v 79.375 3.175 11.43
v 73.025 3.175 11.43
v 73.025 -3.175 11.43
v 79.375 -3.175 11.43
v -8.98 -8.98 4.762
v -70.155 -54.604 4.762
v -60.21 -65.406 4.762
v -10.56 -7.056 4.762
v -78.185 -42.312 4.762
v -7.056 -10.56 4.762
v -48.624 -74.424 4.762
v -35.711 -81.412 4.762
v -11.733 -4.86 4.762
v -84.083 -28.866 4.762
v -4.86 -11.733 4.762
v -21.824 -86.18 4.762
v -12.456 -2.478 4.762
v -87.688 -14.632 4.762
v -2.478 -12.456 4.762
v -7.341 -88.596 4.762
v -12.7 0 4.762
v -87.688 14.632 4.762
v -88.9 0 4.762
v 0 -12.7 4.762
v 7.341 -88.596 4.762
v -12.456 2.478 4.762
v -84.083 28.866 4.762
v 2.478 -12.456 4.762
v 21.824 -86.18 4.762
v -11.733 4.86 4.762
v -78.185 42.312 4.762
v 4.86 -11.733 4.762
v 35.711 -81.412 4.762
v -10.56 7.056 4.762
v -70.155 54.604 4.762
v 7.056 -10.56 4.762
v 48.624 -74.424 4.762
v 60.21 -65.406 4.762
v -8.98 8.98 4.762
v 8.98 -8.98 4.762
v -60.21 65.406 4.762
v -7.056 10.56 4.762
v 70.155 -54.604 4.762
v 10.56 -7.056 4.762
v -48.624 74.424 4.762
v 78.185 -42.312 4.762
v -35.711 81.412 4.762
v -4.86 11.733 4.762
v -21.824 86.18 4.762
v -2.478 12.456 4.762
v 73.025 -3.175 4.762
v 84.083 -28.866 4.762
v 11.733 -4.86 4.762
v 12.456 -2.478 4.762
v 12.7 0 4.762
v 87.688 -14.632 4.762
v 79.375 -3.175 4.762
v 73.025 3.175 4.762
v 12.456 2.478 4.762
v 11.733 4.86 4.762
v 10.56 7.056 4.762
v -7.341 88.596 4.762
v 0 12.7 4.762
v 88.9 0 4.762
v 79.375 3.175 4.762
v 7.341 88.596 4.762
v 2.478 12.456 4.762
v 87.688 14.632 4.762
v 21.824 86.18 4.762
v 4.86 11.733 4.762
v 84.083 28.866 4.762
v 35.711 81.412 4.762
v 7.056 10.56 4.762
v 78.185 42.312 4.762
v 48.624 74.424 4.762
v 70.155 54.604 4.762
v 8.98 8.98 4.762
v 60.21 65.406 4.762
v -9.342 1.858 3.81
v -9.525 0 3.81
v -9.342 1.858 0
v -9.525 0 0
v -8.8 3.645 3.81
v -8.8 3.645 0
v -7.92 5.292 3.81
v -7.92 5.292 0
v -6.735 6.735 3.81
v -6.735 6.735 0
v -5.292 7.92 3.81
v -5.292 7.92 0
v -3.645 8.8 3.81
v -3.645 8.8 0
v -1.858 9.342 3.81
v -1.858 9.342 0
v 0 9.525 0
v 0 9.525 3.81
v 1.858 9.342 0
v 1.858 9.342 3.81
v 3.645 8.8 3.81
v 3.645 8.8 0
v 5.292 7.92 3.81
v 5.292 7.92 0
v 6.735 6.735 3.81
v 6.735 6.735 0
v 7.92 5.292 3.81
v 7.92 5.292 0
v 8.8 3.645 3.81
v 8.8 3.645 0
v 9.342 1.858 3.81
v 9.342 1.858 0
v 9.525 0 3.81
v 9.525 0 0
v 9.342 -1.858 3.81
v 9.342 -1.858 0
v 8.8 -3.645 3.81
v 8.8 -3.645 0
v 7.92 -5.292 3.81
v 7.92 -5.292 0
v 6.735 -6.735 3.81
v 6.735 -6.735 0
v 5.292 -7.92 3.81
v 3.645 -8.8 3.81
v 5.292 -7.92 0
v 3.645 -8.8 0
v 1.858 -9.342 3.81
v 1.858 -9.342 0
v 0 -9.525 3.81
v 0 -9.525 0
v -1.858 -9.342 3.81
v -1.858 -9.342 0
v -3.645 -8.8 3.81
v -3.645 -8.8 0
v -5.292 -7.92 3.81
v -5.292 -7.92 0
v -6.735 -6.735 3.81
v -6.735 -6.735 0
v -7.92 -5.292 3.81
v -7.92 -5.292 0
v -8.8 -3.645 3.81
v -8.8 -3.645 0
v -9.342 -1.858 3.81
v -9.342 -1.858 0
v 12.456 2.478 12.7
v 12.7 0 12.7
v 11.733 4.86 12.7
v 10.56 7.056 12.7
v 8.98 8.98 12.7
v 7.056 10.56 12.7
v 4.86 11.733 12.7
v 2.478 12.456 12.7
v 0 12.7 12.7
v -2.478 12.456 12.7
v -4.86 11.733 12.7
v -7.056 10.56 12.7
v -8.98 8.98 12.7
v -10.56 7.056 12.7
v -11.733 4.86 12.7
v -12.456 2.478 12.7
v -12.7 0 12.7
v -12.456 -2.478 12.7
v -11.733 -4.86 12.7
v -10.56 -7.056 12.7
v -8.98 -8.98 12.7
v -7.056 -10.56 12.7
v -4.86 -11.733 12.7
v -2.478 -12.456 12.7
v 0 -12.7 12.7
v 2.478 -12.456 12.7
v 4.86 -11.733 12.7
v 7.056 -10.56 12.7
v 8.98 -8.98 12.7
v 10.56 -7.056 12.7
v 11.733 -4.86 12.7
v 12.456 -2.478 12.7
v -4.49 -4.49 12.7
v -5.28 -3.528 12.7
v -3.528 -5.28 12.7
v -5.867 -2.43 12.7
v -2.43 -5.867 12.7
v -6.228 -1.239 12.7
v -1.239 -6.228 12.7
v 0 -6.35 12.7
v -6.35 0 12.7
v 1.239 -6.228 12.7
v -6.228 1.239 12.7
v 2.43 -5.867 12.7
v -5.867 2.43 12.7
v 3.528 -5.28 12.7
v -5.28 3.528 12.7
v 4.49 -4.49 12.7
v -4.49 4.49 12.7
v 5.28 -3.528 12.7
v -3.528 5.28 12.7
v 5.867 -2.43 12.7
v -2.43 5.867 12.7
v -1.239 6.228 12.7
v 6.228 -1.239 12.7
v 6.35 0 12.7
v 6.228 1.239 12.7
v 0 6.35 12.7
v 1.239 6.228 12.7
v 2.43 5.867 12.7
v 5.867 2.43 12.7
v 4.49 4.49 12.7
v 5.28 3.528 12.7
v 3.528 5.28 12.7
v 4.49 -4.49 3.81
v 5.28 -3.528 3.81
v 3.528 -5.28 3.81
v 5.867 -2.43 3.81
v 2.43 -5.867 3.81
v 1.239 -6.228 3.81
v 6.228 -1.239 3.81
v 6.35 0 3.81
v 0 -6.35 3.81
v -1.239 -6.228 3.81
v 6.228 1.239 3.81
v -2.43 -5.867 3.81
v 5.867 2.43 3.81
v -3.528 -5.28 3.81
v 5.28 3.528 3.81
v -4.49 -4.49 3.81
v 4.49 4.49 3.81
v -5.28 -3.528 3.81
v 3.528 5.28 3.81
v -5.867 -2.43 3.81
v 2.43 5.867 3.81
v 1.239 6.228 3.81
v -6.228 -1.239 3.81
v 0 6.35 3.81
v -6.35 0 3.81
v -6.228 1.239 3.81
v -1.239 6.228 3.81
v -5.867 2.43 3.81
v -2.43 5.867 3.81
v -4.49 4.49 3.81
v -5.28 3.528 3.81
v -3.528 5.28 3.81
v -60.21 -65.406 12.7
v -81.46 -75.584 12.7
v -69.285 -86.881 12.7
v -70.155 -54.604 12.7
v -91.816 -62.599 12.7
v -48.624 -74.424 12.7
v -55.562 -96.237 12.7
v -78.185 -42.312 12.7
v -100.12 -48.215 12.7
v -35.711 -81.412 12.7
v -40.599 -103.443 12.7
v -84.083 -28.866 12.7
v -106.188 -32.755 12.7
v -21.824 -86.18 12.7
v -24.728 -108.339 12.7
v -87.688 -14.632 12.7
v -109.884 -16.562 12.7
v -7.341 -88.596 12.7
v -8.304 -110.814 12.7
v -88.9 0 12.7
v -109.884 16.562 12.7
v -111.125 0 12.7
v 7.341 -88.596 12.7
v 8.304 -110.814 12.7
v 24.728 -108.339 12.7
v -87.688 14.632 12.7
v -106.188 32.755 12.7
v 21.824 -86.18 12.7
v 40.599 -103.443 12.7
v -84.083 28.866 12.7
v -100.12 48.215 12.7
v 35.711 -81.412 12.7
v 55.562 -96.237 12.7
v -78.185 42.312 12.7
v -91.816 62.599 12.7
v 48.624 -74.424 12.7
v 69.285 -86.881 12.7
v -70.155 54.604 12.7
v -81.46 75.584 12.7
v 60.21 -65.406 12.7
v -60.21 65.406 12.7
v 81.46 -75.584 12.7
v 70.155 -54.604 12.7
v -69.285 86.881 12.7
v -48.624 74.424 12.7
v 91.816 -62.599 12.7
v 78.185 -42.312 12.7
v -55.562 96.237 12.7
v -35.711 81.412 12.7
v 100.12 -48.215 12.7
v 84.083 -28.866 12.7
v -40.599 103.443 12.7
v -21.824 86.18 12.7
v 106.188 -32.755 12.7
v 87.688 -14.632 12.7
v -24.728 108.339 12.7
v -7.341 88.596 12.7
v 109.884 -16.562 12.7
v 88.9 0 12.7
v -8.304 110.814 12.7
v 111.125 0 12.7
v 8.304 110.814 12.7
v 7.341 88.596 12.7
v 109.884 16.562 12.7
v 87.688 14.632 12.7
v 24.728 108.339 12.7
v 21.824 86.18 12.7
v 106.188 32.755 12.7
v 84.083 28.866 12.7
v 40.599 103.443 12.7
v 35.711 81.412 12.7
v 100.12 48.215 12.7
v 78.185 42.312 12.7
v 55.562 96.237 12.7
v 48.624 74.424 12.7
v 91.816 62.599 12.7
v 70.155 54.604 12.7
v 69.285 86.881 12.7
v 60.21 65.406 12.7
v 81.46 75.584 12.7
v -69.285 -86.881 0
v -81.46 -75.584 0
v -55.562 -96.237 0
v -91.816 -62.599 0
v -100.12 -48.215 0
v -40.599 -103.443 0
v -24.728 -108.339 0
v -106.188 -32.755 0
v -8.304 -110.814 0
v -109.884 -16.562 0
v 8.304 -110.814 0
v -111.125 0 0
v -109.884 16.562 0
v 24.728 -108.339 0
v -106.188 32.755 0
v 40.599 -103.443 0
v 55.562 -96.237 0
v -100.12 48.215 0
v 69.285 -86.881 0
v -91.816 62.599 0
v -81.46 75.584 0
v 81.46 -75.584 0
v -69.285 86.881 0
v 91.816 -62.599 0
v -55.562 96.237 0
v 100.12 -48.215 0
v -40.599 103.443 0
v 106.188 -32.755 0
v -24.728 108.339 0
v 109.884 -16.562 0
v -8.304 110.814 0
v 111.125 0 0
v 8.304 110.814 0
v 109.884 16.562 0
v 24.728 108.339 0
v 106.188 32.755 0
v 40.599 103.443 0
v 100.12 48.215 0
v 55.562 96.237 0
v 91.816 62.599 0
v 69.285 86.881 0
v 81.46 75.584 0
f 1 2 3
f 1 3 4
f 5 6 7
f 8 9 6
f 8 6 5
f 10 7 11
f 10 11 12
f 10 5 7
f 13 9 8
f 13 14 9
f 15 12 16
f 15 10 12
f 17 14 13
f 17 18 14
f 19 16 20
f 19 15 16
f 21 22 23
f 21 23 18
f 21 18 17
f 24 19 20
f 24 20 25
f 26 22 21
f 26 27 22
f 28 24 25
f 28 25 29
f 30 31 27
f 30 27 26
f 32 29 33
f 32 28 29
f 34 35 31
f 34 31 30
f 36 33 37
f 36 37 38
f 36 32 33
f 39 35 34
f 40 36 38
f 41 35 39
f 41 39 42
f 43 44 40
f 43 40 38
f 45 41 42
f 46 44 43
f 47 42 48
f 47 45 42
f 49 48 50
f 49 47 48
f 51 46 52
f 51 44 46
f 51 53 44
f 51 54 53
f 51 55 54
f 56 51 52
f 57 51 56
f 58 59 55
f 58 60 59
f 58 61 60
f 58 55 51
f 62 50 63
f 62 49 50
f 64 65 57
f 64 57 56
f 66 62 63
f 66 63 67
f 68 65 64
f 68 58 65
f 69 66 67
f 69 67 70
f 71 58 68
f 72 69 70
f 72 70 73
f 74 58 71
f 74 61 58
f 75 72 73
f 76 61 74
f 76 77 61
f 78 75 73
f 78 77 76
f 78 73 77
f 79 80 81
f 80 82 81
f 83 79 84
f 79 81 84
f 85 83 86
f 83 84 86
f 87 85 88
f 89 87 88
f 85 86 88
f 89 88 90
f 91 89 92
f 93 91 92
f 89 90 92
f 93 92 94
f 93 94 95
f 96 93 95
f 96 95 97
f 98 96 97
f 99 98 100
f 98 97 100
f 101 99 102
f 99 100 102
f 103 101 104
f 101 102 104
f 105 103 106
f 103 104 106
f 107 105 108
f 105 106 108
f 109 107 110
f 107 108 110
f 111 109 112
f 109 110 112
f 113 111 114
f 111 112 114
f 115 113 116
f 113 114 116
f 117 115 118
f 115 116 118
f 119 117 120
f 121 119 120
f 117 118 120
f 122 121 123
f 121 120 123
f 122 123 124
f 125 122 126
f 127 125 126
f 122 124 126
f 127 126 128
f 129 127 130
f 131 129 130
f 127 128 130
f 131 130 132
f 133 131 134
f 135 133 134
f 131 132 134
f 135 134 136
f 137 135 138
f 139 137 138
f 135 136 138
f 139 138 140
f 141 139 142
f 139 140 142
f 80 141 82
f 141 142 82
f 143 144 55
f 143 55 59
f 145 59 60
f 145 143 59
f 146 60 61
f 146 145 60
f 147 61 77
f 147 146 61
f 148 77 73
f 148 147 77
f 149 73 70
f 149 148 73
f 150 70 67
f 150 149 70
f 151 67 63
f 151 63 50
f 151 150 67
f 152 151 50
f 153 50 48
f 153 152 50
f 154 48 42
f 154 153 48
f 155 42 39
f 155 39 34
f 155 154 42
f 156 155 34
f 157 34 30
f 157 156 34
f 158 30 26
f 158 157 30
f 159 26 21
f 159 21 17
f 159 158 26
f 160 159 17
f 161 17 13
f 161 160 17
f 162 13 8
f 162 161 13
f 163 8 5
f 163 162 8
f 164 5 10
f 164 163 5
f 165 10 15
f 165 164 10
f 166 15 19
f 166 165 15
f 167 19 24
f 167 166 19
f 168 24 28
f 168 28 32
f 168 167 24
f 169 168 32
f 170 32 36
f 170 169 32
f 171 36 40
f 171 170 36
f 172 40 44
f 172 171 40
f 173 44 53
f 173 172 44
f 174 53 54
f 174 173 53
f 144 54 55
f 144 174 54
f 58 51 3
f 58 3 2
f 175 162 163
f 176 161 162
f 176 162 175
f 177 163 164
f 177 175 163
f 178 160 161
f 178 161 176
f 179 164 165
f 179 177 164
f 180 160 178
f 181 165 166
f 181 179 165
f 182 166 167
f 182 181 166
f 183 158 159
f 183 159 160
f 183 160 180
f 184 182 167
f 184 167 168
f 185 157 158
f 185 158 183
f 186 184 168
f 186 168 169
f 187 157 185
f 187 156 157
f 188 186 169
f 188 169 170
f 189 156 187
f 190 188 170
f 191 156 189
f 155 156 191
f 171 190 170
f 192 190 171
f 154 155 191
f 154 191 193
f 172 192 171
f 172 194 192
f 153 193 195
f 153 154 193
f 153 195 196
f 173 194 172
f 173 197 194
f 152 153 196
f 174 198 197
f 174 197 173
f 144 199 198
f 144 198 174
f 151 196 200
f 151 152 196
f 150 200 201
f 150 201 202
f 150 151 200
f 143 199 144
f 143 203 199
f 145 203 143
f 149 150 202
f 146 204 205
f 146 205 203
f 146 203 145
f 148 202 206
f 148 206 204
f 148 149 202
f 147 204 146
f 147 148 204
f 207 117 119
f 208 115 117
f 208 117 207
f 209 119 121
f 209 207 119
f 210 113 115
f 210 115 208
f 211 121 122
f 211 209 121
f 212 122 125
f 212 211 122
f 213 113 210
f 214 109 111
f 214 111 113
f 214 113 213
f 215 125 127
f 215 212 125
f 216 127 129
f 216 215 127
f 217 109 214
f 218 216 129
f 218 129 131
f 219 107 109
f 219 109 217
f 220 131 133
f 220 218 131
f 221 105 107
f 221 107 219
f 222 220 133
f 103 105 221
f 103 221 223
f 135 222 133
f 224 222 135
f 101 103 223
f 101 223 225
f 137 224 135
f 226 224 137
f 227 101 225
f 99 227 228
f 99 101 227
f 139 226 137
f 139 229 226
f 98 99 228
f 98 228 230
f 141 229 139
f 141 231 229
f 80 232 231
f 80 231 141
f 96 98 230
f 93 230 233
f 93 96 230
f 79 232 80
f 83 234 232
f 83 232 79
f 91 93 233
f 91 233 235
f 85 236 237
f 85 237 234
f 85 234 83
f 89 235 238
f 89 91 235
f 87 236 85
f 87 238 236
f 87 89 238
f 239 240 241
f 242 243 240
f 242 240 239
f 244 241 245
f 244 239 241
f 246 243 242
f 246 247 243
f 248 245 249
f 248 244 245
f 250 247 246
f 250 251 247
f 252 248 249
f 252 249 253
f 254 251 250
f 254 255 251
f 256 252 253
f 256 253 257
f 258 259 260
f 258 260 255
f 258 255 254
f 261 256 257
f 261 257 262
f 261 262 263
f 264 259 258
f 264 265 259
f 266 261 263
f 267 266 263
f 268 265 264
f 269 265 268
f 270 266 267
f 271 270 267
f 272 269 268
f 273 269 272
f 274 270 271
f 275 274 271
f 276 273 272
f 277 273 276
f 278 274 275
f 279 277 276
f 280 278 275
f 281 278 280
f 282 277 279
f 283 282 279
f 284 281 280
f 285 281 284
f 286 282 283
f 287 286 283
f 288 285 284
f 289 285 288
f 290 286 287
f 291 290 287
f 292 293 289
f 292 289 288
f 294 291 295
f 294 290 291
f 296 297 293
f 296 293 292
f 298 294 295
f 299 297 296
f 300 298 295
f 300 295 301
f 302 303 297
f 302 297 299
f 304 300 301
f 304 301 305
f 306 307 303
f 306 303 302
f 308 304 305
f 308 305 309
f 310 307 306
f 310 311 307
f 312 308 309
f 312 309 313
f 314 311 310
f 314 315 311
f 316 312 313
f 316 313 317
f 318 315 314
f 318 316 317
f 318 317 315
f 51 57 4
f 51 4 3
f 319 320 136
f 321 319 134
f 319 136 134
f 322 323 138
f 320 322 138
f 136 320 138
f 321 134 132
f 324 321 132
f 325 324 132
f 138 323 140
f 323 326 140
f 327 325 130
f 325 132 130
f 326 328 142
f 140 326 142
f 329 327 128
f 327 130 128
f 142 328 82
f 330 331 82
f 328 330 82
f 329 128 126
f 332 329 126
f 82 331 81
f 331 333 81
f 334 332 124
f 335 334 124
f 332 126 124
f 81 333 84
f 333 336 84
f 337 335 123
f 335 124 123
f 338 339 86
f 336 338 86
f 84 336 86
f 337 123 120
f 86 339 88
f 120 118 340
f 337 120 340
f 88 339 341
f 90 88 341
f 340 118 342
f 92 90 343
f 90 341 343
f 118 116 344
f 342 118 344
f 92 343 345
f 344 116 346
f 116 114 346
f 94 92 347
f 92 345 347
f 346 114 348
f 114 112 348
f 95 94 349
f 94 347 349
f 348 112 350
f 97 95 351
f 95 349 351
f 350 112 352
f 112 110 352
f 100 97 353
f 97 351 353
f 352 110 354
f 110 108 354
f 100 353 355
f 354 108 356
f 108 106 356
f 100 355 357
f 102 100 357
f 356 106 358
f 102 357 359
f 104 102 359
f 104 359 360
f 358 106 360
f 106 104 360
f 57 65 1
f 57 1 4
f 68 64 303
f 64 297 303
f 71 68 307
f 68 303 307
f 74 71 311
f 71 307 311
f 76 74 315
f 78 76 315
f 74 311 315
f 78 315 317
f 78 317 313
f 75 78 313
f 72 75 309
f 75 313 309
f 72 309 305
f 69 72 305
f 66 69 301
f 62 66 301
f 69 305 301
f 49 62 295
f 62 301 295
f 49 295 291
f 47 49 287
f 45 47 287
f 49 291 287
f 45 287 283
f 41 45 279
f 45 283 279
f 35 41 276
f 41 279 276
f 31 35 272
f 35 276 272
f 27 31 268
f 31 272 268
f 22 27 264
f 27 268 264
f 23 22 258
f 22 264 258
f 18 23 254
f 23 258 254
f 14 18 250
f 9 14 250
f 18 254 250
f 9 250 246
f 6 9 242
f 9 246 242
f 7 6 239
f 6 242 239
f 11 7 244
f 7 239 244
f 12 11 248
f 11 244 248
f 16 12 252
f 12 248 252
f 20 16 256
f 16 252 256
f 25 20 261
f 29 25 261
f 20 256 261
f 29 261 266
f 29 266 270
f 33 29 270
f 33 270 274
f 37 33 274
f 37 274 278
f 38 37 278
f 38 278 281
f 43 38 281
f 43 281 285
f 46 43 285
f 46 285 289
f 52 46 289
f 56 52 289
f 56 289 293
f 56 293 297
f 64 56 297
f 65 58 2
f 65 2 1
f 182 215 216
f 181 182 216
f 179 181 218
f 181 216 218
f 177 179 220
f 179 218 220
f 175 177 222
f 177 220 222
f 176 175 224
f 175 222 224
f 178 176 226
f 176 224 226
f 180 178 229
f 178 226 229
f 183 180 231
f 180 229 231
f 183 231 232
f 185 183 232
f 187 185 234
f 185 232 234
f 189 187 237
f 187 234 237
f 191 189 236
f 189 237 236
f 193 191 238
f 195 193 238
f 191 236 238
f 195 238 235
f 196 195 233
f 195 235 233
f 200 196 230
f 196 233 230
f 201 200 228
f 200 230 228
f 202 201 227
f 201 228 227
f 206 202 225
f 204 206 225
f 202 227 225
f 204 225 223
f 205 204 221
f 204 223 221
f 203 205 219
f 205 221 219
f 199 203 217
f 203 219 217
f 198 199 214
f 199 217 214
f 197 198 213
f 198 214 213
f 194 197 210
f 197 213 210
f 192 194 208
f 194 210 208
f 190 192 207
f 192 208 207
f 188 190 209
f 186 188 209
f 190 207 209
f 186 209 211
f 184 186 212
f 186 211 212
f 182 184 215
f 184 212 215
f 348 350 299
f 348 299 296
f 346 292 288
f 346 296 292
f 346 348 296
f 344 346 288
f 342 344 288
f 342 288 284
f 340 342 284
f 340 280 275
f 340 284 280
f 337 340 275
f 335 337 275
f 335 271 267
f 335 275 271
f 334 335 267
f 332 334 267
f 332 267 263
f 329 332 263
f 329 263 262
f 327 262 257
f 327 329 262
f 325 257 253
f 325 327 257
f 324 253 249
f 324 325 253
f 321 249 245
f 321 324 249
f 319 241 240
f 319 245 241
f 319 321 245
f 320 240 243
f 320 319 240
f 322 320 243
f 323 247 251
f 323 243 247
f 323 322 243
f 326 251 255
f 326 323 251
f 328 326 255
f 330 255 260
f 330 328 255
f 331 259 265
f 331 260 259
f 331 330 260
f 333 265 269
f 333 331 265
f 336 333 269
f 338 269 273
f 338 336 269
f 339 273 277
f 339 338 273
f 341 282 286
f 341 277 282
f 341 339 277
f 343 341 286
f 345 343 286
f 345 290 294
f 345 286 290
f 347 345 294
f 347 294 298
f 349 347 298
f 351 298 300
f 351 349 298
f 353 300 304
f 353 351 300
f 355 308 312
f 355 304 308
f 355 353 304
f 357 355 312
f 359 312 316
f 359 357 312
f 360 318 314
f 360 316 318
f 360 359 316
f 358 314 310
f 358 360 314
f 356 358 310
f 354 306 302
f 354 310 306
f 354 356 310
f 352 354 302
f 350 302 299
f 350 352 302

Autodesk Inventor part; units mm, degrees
ref_plane "YZ Plane" through (0, 0, 0) normal (1, 0, 0) x (0, 1, 0)
ref_plane "XZ Plane" through (0, 0, 0) normal (0, 1, 0) x (-1, 0, 0)
ref_plane "XY Plane" through (0, 0, 0) normal (0, 0, 1) x (1, 0, 0)
sketch "Sketch1" plane through (0, 0, 0) normal (0, 0, 1) x (1, 0, 0)
  circle A0 centre (0, 0) radius 111.125
  dimension "d0" = 222.25
extrude "Extrusion1" add sketch "Sketch1" along normal blind 12.7
sketch "Sketch2" plane through (0, 0, 12.7) normal (0, 0, 1) x (1, 0, 0)
  circle A0 centre (0, 0) radius 111.125 projected
  circle A1 centre (0, 0) radius 88.9
  circle A2 centre (0, 0) radius 12.7
  dimension "d3" = 177.8
  dimension "d4" = 25.4
extrude "Extrusion2" cut sketch "Sketch2" against normal blind 7.9375 contours A1
sketch "Sketch3" plane through (0, 0, 12.7) normal (0, 0, 1) x (1, 0, 0)
  circle A0 centre (0, 0) radius 12.7 projected
hole "Hole1" at (0, 0, 12.7) direction (0, 0, -1) diameter 12.7 end through all
sketch "Sketch4" plane through (0, 0, 4.7625) normal (0, 0, 1) x (1, 0, 0)
  circle A0 centre (0, 0) radius 12.7 projected
  line L0 (73.025, 3.175) -> (79.375, 3.175)
  line L1 (79.375, 3.175) -> (79.375, -3.175)
  line L2 (79.375, -3.175) -> (73.025, -3.175)
  line L3 (73.025, -3.175) -> (73.025, 3.175)
  circle A1 centre (76.2, 0) radius 3.175 construction
  circle A2 centre (0, 0) radius 6.35 projected
  dimension "d14" = 76.2
  dimension "d15" = 6.35
extrude "Extrusion3" add sketch "Sketch4" along normal blind 6.6675 contours L0 L1 L2 L3
sketch "Sketch5" plane through (0, 0, 0) normal (0, 0, -1) x (-1, 0, 0)
  circle A0 centre (0, 0) radius 6.35 projected
  circle A1 centre (0, 0) radius 111.125 projected
  circle A2 centre (0, 0) radius 9.525
  dimension "d18" = 19.05
extrude "Extrusion4" cut sketch "Sketch5" against normal blind 3.81 contours A2
properties part number "base"
